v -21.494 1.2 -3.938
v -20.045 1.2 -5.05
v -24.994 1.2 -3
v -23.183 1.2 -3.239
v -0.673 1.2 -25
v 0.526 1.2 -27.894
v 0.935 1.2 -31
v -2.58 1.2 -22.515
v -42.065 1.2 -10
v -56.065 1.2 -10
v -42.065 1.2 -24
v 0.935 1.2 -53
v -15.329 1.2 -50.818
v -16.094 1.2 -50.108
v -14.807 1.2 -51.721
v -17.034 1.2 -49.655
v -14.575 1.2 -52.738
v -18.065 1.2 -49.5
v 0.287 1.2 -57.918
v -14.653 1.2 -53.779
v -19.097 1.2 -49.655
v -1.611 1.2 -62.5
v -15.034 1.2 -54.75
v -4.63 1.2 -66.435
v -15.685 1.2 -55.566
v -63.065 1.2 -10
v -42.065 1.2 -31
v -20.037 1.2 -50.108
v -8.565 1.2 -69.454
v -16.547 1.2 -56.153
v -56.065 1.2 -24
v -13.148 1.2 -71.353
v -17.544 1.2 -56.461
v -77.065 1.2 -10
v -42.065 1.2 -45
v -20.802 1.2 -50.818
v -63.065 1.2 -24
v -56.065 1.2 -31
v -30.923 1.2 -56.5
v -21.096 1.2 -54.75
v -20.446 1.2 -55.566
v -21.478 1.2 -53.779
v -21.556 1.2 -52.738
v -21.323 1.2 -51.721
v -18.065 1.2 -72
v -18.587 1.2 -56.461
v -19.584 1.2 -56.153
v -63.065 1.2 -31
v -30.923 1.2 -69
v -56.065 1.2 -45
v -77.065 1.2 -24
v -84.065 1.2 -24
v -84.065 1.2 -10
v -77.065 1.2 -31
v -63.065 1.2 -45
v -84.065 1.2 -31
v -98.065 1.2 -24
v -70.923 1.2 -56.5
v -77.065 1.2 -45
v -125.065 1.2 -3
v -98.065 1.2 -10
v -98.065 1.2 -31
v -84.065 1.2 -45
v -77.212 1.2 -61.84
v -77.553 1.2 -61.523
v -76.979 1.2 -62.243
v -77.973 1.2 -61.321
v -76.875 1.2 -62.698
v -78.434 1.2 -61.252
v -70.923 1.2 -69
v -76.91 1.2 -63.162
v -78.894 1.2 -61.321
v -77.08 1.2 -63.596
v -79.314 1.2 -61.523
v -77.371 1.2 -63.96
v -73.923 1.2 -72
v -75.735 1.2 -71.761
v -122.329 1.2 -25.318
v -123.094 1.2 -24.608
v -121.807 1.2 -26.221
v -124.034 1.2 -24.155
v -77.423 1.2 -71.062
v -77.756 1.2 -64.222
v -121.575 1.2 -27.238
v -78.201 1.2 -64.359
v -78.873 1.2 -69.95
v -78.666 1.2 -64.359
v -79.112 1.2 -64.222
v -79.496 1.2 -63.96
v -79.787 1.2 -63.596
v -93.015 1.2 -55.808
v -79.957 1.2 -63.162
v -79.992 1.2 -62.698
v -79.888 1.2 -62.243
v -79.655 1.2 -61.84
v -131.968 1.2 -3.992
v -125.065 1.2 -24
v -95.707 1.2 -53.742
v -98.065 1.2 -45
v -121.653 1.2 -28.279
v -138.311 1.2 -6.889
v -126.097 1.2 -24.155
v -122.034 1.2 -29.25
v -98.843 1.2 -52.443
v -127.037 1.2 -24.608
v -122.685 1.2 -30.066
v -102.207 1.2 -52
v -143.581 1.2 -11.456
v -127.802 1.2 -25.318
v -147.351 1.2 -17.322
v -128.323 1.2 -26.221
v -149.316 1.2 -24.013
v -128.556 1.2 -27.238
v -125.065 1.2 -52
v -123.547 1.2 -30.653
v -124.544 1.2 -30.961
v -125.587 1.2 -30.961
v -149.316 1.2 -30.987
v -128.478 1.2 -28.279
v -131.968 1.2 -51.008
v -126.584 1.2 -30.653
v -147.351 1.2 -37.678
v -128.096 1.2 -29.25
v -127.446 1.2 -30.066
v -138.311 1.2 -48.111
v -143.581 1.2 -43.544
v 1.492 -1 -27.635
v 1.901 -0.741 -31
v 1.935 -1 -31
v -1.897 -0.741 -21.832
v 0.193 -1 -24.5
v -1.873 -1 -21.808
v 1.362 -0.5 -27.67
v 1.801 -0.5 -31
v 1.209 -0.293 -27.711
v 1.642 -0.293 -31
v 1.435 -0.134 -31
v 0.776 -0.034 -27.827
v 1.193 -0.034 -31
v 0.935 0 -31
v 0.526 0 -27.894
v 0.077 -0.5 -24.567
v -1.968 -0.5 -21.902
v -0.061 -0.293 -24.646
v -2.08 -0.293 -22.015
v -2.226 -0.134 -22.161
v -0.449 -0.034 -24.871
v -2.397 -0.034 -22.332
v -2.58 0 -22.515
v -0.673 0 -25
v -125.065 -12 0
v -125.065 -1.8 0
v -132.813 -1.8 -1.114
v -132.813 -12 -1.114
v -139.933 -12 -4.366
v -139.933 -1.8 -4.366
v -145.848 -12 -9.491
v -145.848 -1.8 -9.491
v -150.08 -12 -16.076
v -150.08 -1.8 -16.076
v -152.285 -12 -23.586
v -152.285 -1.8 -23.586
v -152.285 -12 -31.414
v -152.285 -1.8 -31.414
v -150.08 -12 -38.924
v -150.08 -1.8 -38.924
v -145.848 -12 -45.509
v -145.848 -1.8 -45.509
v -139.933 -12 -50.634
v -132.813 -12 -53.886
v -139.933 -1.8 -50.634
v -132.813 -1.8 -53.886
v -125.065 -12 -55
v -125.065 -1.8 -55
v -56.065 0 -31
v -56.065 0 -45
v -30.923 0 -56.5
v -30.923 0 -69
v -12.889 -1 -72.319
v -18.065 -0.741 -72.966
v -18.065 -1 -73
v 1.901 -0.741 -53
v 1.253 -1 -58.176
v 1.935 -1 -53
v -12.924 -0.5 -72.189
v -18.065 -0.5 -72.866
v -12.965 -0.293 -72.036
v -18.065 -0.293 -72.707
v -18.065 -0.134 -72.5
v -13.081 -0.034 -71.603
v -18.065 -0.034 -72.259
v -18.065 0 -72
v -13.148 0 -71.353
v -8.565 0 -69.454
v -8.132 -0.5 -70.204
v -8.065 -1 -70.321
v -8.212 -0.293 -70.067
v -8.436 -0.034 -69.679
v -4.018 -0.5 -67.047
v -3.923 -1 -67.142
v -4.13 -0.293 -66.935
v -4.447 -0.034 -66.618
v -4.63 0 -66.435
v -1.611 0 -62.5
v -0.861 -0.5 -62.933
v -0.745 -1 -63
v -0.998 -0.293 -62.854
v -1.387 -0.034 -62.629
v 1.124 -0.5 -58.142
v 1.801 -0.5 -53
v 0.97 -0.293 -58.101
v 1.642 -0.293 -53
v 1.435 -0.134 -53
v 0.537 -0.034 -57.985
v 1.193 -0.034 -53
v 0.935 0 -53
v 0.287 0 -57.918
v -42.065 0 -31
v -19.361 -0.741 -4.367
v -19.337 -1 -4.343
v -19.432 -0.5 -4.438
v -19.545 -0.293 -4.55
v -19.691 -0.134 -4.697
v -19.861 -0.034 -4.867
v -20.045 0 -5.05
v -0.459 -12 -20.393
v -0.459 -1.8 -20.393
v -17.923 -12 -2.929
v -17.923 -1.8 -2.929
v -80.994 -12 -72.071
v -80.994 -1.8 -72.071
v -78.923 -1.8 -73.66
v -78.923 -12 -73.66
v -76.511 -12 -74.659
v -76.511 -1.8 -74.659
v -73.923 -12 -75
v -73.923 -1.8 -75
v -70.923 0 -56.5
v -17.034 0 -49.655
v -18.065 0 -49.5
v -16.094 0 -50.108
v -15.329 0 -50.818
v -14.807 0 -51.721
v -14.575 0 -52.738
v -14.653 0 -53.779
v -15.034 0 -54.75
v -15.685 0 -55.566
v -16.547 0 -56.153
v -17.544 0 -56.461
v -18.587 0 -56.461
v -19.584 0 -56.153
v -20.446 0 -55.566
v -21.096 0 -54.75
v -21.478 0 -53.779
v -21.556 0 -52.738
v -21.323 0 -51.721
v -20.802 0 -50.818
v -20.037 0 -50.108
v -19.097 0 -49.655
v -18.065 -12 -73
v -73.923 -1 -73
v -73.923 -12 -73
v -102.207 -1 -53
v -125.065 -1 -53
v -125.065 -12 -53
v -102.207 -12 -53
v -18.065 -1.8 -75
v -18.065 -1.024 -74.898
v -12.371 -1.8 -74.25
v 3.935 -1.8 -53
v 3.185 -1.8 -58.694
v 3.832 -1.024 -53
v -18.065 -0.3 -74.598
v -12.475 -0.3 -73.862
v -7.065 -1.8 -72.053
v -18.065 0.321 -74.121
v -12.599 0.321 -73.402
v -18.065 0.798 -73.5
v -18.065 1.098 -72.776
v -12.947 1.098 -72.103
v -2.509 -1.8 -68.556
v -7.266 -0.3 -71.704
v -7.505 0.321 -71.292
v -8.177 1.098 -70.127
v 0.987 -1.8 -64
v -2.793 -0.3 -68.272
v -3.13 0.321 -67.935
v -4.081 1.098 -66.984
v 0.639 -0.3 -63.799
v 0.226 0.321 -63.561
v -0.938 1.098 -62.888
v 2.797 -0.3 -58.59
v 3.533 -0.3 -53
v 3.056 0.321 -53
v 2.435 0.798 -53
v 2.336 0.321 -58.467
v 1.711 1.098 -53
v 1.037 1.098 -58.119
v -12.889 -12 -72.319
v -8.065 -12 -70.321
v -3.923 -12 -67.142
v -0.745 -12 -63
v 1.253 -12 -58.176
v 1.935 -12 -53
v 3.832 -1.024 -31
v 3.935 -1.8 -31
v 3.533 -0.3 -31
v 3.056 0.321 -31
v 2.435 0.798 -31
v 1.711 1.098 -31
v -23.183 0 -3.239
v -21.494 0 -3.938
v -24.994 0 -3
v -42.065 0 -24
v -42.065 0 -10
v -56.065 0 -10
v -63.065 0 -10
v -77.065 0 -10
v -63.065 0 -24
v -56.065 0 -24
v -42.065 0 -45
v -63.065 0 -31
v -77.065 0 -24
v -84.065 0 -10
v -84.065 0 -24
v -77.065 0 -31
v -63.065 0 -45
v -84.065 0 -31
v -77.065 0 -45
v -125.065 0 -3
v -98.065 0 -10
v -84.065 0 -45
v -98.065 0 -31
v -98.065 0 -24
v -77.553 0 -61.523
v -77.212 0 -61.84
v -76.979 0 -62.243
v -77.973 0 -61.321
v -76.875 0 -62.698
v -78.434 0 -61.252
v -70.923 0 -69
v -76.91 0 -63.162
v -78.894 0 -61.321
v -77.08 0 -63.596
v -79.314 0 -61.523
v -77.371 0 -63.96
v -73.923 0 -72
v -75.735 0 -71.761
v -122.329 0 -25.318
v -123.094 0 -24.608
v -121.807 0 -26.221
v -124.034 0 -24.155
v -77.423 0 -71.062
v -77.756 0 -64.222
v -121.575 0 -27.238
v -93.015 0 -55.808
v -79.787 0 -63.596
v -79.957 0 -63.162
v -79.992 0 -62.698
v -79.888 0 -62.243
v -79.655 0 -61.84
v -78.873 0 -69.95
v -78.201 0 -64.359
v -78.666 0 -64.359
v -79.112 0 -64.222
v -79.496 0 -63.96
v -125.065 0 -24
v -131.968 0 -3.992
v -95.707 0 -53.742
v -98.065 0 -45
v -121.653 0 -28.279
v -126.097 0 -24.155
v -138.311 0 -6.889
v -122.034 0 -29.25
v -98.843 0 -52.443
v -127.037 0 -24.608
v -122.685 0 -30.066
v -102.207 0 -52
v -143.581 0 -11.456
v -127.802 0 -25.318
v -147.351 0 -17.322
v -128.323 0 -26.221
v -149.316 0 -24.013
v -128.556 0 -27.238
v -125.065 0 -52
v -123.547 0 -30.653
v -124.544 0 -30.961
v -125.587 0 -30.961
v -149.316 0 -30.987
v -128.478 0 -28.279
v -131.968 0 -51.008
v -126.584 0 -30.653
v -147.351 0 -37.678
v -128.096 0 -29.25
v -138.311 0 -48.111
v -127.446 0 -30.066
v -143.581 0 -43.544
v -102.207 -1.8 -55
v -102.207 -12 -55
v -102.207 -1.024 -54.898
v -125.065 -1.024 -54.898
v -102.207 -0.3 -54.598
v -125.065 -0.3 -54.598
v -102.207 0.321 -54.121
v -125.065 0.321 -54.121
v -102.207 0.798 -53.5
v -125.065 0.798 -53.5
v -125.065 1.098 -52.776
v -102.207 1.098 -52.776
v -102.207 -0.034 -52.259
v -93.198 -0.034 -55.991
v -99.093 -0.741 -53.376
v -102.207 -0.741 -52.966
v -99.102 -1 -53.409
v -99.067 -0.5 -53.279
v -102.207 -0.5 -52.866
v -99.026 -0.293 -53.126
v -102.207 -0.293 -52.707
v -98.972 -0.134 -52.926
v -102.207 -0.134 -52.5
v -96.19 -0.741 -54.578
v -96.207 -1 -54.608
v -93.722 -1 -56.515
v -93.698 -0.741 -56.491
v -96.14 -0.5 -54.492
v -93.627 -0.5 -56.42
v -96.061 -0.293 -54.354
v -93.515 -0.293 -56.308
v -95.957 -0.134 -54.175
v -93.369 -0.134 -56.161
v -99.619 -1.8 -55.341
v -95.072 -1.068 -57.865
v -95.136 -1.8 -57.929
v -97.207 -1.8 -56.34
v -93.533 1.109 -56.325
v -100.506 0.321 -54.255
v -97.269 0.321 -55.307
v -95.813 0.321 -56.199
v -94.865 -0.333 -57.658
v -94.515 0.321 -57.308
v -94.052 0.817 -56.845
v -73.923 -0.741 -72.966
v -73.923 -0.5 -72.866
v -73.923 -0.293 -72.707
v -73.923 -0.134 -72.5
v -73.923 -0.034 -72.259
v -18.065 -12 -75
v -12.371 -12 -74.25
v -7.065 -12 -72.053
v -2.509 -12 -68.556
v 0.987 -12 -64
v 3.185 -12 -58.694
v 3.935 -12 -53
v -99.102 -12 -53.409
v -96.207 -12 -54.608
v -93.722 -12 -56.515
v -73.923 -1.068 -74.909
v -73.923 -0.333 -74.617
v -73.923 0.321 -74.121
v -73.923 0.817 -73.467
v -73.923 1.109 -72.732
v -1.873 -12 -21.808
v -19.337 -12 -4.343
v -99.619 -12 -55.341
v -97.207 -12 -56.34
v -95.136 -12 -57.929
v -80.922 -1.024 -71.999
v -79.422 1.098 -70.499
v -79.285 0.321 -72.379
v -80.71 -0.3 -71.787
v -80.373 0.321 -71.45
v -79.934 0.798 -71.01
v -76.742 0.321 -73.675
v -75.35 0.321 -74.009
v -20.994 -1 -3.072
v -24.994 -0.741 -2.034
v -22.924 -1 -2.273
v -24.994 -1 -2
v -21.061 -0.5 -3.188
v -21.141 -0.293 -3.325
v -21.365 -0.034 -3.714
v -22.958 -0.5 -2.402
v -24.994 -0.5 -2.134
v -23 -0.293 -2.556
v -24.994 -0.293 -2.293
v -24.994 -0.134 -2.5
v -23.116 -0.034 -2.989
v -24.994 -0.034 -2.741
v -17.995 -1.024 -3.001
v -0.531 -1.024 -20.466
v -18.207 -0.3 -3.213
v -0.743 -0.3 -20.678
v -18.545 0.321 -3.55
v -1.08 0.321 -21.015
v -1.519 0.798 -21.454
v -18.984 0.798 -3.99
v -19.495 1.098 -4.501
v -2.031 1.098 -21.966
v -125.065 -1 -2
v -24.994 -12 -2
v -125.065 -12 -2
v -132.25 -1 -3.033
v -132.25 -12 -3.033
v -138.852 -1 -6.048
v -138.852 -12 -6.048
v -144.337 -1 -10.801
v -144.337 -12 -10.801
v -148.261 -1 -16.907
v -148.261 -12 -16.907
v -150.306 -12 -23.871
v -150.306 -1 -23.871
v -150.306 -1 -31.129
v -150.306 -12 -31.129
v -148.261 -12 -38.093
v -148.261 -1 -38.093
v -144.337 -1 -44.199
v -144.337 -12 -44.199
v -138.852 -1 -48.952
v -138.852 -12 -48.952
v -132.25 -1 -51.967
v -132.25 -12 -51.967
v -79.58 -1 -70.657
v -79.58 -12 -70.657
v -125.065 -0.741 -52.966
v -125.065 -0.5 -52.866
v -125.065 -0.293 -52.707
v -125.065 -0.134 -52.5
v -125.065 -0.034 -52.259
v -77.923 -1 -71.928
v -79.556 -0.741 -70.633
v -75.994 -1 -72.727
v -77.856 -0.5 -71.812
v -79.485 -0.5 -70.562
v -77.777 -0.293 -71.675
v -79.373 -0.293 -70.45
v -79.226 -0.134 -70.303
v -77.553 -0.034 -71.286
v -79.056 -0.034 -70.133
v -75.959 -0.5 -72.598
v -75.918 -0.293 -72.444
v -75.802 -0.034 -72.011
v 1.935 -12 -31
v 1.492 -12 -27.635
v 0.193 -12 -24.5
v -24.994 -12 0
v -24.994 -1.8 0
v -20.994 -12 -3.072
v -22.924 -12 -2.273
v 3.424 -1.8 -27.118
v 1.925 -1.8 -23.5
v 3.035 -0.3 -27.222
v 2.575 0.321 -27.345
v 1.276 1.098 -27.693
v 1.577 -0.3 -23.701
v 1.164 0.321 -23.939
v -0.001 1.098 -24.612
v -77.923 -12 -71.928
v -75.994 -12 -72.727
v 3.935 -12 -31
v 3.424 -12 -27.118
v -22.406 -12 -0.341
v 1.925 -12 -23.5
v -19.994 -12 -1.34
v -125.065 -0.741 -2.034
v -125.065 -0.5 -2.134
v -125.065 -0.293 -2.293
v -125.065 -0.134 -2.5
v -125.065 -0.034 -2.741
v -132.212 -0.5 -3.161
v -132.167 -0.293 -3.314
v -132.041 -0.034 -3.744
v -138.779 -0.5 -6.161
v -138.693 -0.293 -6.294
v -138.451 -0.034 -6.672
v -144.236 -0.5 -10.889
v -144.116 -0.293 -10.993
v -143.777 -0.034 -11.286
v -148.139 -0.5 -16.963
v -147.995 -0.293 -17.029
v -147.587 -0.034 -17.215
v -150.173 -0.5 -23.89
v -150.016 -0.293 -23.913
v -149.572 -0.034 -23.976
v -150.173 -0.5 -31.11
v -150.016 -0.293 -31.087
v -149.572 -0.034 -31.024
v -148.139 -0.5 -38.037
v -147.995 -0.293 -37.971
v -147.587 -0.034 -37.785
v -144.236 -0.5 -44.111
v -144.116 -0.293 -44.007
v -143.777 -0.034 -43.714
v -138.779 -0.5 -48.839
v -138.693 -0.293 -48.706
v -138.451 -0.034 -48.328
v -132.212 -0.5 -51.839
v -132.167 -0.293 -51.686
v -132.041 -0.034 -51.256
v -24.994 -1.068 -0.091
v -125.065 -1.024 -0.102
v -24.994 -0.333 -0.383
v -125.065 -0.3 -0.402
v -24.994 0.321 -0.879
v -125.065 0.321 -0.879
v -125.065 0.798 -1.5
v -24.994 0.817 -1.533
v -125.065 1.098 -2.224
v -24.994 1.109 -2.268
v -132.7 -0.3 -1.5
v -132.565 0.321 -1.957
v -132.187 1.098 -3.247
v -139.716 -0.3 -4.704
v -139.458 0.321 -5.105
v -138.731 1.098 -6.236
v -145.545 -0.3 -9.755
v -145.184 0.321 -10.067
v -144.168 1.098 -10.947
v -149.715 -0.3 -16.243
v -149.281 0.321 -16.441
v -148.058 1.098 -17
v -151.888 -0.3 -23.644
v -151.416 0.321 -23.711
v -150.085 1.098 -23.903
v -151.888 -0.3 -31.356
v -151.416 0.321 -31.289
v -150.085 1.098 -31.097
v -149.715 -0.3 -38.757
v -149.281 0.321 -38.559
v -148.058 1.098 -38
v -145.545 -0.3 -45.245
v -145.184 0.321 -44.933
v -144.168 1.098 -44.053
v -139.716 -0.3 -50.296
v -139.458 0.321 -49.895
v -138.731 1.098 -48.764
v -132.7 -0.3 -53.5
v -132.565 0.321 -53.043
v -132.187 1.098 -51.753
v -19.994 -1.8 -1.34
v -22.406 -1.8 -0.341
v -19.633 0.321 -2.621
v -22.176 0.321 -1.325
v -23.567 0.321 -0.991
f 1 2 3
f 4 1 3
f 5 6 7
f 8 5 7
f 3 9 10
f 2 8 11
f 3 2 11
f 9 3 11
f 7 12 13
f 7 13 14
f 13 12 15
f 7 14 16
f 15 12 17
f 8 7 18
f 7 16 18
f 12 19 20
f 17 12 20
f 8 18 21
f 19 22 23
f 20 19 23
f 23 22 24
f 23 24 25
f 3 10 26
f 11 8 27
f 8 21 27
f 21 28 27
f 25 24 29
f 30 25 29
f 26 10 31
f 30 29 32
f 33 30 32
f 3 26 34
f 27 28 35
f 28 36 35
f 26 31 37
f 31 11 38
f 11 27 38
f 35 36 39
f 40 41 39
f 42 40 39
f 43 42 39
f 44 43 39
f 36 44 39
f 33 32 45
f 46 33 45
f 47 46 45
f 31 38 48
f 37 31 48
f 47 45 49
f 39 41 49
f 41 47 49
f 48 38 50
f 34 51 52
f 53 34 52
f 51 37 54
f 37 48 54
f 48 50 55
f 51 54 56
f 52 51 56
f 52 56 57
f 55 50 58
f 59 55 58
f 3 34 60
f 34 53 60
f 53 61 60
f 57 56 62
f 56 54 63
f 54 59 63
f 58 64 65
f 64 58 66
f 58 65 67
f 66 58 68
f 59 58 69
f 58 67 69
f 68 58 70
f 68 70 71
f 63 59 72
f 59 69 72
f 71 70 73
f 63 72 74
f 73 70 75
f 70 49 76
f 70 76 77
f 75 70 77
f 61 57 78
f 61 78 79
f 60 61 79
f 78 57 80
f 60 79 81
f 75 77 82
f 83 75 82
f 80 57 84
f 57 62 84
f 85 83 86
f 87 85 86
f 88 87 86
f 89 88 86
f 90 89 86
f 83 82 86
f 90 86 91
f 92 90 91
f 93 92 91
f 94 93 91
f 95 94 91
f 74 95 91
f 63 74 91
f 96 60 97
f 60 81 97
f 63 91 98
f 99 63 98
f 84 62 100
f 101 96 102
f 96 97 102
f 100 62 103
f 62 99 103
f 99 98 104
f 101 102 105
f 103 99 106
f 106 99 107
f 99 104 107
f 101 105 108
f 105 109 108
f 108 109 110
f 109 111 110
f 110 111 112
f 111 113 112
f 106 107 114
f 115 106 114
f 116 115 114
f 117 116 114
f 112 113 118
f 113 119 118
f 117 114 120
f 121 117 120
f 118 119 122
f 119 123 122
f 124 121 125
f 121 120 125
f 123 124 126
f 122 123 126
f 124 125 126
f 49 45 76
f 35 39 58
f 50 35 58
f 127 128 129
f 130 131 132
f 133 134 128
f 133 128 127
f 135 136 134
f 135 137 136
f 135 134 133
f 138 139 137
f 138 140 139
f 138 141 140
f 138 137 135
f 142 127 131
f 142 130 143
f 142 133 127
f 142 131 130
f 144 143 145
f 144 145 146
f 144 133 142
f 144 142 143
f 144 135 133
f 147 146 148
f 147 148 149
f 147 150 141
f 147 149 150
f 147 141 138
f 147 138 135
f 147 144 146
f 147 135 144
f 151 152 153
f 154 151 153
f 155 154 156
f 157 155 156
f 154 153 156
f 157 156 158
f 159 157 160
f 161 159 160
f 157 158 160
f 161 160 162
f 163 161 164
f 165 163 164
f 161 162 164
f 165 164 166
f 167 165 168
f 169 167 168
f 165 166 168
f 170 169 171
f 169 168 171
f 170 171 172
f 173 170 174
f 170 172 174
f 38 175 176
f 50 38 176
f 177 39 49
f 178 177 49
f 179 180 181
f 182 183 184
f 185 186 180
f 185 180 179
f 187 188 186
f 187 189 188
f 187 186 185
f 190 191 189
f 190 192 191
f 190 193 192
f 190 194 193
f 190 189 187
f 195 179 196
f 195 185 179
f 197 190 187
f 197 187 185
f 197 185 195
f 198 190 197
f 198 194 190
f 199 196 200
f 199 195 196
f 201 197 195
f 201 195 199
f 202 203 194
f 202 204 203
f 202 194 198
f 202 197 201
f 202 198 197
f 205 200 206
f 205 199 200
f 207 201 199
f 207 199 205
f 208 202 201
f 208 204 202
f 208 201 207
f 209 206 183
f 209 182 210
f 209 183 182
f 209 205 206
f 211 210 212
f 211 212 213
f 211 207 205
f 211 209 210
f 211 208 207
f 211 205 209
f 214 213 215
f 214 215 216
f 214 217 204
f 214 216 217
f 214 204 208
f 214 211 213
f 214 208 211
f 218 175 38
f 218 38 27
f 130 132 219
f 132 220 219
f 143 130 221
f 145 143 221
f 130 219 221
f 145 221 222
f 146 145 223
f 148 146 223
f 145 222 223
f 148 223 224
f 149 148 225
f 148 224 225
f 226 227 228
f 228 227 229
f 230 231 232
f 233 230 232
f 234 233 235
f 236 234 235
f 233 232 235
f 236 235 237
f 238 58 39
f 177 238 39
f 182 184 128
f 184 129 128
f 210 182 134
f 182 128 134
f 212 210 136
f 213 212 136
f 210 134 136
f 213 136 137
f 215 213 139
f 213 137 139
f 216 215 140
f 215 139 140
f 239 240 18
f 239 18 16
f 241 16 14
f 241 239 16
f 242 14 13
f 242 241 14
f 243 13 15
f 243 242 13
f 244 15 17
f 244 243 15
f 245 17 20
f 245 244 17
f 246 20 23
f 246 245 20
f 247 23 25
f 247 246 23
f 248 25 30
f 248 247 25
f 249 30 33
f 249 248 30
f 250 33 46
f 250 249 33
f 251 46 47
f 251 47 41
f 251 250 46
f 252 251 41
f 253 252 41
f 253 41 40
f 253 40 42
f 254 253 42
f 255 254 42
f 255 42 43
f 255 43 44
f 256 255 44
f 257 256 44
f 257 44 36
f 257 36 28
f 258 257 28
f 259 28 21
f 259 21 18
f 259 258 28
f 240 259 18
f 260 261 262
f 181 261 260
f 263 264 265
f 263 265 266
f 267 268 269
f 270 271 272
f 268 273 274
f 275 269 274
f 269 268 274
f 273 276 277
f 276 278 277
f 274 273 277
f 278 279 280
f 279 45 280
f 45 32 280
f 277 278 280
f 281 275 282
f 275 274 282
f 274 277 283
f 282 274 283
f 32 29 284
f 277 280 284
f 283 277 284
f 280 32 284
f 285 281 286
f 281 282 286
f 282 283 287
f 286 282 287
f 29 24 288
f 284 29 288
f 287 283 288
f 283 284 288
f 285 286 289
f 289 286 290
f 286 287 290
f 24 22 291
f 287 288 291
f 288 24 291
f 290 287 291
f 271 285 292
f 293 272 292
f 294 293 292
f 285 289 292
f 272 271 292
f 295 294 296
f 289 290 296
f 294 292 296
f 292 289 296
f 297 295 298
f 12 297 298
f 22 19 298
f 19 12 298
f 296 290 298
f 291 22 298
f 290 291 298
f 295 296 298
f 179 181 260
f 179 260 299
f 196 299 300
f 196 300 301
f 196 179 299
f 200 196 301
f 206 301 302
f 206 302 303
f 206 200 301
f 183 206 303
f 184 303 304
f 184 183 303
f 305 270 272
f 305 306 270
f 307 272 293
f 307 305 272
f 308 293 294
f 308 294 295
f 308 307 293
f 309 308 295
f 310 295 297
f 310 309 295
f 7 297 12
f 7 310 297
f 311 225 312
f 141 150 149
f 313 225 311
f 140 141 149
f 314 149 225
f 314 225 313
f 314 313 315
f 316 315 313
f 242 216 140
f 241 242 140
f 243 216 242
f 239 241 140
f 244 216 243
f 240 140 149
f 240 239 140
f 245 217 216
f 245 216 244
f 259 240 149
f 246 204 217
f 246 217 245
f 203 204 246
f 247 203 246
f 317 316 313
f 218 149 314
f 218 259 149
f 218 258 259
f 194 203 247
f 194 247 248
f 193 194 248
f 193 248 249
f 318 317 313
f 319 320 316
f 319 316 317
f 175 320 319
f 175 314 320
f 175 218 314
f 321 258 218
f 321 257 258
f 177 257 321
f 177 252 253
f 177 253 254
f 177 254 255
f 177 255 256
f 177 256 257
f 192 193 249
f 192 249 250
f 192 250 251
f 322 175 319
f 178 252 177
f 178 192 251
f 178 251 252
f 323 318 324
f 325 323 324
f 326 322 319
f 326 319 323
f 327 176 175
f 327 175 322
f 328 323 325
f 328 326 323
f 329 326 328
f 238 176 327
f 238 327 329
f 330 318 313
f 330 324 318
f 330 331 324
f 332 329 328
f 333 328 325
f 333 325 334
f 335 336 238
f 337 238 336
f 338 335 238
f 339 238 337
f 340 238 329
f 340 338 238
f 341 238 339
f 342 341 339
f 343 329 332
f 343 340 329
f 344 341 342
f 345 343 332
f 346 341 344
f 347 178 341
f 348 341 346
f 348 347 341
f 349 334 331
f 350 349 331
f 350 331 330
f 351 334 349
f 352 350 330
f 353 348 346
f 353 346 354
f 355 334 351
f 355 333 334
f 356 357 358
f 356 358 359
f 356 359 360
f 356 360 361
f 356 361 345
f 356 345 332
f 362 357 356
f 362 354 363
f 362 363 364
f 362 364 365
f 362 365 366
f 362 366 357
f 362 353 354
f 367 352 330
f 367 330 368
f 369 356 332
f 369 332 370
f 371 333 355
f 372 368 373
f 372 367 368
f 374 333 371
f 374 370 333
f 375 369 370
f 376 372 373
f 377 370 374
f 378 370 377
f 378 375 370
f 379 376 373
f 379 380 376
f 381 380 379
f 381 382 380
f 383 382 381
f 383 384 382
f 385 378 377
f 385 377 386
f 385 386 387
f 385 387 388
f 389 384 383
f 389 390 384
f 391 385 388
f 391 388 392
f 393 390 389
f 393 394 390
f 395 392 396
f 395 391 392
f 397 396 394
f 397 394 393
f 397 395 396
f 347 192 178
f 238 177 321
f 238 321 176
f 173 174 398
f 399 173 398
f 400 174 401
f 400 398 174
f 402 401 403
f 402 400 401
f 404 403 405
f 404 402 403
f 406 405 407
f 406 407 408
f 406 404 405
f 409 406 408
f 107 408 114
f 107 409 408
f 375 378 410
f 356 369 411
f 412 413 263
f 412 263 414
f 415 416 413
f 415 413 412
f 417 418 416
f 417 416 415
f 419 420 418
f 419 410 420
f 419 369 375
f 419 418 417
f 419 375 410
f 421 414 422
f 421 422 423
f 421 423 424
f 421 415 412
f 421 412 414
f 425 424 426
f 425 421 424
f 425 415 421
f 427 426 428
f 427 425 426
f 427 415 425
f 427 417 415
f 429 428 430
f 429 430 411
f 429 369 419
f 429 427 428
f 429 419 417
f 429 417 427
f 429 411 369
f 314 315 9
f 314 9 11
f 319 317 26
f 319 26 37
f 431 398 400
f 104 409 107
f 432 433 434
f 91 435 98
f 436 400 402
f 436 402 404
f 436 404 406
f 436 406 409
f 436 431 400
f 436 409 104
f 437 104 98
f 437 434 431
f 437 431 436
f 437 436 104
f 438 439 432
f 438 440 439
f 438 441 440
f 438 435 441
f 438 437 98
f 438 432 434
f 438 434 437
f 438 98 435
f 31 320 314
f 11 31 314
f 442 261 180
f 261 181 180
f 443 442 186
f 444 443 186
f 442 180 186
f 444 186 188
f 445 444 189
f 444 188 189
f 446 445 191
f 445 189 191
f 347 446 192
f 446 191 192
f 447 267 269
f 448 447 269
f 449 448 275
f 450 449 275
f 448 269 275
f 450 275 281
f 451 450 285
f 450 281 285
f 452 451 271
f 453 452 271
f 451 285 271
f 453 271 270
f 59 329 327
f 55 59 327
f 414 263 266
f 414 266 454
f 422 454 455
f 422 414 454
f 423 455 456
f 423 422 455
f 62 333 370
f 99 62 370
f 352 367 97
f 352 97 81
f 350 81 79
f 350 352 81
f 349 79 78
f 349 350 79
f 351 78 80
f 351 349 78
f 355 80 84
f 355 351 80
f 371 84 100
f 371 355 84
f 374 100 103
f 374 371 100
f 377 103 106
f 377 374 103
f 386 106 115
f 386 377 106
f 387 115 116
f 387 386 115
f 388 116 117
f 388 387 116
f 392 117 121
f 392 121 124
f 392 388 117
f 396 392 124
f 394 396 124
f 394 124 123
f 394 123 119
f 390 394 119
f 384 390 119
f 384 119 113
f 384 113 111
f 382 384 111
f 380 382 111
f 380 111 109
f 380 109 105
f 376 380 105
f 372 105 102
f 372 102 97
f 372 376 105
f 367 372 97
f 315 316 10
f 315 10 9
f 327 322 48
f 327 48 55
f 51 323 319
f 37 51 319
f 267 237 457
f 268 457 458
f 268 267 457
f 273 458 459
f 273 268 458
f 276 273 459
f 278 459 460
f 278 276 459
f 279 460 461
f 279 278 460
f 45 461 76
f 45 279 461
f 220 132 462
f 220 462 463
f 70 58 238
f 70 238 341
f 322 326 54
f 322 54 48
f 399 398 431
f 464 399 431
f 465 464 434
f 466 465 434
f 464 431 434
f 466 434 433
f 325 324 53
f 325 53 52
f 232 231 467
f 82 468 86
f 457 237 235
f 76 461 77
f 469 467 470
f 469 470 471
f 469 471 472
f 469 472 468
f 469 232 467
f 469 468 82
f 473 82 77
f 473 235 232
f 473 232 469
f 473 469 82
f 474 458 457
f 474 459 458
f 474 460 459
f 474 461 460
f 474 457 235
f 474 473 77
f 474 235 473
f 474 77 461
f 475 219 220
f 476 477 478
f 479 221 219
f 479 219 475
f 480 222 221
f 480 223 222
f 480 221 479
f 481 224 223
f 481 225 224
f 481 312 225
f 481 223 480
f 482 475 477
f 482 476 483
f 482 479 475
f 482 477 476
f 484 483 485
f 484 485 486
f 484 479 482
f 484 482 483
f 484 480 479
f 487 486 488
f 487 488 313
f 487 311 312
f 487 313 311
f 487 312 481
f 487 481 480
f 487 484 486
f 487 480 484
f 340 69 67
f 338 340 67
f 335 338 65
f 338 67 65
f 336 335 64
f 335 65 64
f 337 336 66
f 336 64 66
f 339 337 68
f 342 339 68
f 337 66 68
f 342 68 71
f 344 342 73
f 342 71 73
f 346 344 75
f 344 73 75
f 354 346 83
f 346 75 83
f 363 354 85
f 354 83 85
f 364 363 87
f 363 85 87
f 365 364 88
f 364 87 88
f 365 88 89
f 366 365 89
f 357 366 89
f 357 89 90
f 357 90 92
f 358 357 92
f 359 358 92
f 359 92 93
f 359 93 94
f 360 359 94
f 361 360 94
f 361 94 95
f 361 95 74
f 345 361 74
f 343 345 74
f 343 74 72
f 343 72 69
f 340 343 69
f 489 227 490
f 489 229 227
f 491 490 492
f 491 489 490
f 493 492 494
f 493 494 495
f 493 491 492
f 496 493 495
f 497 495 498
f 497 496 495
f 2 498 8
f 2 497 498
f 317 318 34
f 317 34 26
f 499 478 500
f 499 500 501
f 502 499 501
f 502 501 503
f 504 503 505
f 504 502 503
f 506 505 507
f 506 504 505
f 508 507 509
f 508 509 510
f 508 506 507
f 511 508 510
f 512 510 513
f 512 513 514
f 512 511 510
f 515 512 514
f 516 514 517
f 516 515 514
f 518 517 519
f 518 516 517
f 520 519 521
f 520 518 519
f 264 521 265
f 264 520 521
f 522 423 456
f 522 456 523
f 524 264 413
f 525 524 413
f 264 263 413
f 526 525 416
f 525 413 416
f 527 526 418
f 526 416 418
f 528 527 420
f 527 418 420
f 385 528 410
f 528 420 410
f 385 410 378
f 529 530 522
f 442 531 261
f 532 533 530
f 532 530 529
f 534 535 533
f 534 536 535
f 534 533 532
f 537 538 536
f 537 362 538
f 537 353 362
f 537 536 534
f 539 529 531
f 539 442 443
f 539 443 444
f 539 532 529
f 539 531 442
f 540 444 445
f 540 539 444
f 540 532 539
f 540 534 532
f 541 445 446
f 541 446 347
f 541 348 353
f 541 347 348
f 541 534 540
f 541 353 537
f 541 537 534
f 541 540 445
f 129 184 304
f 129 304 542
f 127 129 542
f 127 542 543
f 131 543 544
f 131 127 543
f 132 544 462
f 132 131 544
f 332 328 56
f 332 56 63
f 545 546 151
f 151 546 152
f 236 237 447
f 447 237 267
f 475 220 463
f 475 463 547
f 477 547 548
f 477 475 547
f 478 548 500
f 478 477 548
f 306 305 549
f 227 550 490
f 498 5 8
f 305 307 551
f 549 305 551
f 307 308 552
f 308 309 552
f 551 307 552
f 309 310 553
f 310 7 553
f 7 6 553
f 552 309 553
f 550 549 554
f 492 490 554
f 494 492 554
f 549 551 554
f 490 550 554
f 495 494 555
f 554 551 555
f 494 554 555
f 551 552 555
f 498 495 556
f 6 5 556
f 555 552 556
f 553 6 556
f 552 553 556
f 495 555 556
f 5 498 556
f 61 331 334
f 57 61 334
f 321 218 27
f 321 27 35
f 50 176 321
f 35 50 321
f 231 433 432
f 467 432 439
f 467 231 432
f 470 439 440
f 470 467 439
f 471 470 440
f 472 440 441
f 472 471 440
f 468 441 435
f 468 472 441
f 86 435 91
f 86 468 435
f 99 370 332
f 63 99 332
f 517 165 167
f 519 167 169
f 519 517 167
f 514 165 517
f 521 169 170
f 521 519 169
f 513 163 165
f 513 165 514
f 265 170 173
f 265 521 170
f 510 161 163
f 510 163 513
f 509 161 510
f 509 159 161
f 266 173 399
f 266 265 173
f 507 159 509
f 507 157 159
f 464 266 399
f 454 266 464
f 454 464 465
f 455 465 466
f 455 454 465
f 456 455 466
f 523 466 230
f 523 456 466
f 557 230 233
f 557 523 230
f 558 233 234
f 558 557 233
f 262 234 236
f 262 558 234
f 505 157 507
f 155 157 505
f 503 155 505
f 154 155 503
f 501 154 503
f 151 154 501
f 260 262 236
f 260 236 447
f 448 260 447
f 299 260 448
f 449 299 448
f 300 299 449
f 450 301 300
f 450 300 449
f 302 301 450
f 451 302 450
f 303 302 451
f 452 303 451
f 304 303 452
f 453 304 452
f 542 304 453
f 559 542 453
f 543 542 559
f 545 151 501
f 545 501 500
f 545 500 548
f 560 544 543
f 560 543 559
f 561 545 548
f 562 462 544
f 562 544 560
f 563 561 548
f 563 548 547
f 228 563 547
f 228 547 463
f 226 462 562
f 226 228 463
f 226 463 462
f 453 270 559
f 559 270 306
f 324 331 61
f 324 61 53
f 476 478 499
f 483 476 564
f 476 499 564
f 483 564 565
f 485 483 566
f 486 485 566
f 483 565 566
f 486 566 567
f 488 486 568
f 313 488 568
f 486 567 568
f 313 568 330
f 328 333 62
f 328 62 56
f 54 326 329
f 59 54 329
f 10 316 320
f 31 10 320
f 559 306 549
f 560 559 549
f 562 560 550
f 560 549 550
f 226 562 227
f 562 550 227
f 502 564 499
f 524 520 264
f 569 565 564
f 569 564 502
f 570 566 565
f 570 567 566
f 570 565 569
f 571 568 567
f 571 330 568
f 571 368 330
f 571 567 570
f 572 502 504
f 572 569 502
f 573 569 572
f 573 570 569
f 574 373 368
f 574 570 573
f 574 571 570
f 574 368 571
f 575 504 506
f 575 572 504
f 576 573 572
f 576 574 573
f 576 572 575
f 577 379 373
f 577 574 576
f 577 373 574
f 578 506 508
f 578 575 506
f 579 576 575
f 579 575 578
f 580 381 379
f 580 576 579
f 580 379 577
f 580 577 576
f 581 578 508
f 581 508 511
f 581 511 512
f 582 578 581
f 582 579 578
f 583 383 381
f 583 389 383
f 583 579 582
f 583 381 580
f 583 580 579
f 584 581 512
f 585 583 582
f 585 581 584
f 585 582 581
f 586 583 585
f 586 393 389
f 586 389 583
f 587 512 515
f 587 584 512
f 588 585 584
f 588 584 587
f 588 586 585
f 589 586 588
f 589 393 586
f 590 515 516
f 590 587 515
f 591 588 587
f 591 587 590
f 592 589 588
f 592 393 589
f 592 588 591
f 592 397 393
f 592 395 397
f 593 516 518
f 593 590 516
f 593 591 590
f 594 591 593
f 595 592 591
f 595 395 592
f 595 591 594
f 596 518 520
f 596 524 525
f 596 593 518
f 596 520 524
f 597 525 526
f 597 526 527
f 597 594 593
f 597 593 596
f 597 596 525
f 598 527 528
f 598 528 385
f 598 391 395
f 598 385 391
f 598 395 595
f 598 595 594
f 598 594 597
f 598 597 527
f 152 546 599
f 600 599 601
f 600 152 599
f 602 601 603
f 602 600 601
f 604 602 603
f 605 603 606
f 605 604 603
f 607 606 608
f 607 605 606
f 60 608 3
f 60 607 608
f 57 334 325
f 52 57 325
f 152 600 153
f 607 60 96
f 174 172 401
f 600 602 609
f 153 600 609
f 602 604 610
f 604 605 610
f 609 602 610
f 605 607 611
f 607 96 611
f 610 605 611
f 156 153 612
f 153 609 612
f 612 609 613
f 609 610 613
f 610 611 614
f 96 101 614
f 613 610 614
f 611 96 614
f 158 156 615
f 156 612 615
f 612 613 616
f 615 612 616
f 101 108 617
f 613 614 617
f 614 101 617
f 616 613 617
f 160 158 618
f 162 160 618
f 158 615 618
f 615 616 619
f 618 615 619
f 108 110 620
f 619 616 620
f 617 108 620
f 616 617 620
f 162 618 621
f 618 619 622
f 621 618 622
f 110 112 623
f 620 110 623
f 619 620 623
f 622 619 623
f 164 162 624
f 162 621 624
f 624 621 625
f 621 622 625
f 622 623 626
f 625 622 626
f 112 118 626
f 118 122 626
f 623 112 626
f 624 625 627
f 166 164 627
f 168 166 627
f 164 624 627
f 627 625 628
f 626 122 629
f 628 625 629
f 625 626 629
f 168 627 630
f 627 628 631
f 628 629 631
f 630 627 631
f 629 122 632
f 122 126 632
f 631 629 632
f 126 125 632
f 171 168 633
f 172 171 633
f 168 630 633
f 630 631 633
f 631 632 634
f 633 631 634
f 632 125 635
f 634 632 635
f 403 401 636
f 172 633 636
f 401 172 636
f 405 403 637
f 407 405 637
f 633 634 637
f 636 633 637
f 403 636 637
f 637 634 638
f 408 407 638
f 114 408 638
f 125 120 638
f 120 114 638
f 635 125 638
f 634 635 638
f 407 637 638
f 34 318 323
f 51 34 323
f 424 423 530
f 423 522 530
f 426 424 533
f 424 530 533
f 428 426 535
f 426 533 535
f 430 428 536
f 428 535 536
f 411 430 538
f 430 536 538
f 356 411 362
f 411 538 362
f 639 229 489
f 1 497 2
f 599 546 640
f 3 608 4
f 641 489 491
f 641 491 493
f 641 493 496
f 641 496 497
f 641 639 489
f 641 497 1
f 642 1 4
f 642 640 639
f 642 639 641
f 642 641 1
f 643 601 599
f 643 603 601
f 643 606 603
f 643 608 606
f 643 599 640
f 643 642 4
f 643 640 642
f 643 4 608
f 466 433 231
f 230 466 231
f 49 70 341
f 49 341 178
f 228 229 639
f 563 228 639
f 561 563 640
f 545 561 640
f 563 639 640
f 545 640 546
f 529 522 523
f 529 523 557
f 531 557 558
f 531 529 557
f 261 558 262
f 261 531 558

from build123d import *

# Parameters (mm, degrees)
SKETCH1_R           = 3.5
SKETCH1_W           = 14
SKETCH1_H           = 14
BOSS_EXTRUDE1_DEPTH = 1.2
FILLET1_R           = 10
BOSS_EXTRUDE2_DEPTH = 12
FILLET2_R           = 3
FILLET3_R           = 1
SKETCH4_R           = 1.5625
SKETCH4_W           = 40
SKETCH4_H           = 12.5
CUT_EXTRUDE1_DEPTH  = 171.515153338


with BuildPart() as part:
    # Sketch1 → Boss-Extrude1 (new body)
    with BuildSketch(Plane(origin=(0, 0, 0), x_dir=(1, 0, 0), z_dir=(0, 1, 0))):
        with BuildLine():
            Line((-125.065322034, 55), (-98.065322034, 55))
            Line((-98.065322034, 55), (-78.065322034, 75))
            Line((-78.065322034, 75), (-18.065322034, 75))
            ThreePointArc((-18.065322034, 75), (-2.508972848, 68.556349186), (3.934677966, 53))
            Line((3.934677966, 53), (3.934677966, 31))
            ThreePointArc((3.934677966, 31), (2.792870954, 25.259748515), (-0.458720316, 20.393398282))
            Line((-0.458720316, 20.393398282), (-20.852118598, 0))
            Line((-20.852118598, 0), (-25.734830863, 0))
            Line((-25.734830863, 0), (-125.065322034, 0))
            ThreePointArc((-125.065322034, 0), (-152.565322034, 27.5), (-125.065322034, 55))
        make_face()
        with Locations(Location((-125.065322034, 27.5, 0), (0, 0, 270))):
            Circle(SKETCH1_R, mode=Mode.SUBTRACT)
        with Locations(Location((-18.065322034, 53, 0), (0, 0, 270))):
            Circle(SKETCH1_R, mode=Mode.SUBTRACT)
        with Locations((-70.065322034, 17)):
            Rectangle(SKETCH1_W, SKETCH1_H, mode=Mode.SUBTRACT)
        with Locations((-91.065322034, 17)):
            Rectangle(SKETCH1_W, SKETCH1_H, mode=Mode.SUBTRACT)
        with Locations((-49.065322034, 17)):
            Rectangle(SKETCH1_W, SKETCH1_H, mode=Mode.SUBTRACT)
        with Locations((-70.065322034, 38)):
            Rectangle(SKETCH1_W, SKETCH1_H, mode=Mode.SUBTRACT)
        with Locations((-49.065322034, 38)):
            Rectangle(SKETCH1_W, SKETCH1_H, mode=Mode.SUBTRACT)
        with Locations((-91.065322034, 38)):
            Rectangle(SKETCH1_W, SKETCH1_H, mode=Mode.SUBTRACT)
    extrude(amount=BOSS_EXTRUDE1_DEPTH)

    # Fillet1
    fillet1_edges = [part.edges().sort_by_distance(p)[0] for p in [
        (-98.065322034, 0.6, -55),
        (-78.065322034, 0.6, -75),
        (-20.852118598, 0.6, 0),
    ]]
    fillet(fillet1_edges, radius=FILLET1_R)

    # Sketch3 → Boss-Extrude2 (add)
    with BuildSketch(Plane.XZ):
        with BuildLine():
            Line((-0.458720316, -20.393398282), (-17.92318641, -2.928932188))
            ThreePointArc((-17.92318641, -2.928932188), (-21.167419898, -0.761204675), (-24.994254222, 0))
            Line((-24.994254222, 0), (-125.065322034, 0))
            ThreePointArc((-125.065322034, 0), (-152.565322034, -27.5), (-125.065322034, -55))
            Line((-125.065322034, -55), (-102.207457658, -55))
            ThreePointArc((-102.207457658, -55), (-98.380623334, -55.761204675), (-95.136389846, -57.928932188))
            Line((-95.136389846, -57.928932188), (-80.994254222, -72.071067812))
            ThreePointArc((-80.994254222, -72.071067812), (-77.750020734, -74.238795325), (-73.92318641, -75))
            Line((-73.92318641, -75), (-18.065322034, -75))
            ThreePointArc((-18.065322034, -75), (-2.508972848, -68.556349186), (3.934677966, -53))
            Line((3.934677966, -53), (3.934677966, -31))
            ThreePointArc((3.934677966, -31), (2.792870954, -25.259748515), (-0.458720316, -20.393398282))
        make_face()
        with BuildLine():
            Line((-1.872933878, -21.807611845), (-19.337399973, -4.343145751))
            ThreePointArc((-19.337399973, -4.343145751), (-21.932786763, -2.60896374), (-24.994254222, -2))
            Line((-24.994254222, -2), (-125.065322034, -2))
            ThreePointArc((-125.065322034, -2), (-150.565322034, -27.5), (-125.065322034, -53))
            Line((-125.065322034, -53), (-102.207457658, -53))
            ThreePointArc((-102.207457658, -53), (-97.615256469, -53.91344561), (-93.722176283, -56.514718626))
            Line((-93.722176283, -56.514718626), (-79.58004066, -70.656854249))
            ThreePointArc((-79.58004066, -70.656854249), (-76.984653869, -72.39103626), (-73.92318641, -73))
            Line((-73.92318641, -73), (-18.065322034, -73))
            ThreePointArc((-18.065322034, -73), (-3.92318641, -67.142135624), (1.934677966, -53))
            Line((1.934677966, -53), (1.934677966, -31))
            ThreePointArc((1.934677966, -31), (0.945111889, -26.025115379), (-1.872933878, -21.807611845))
        make_face(mode=Mode.SUBTRACT)
    extrude(amount=BOSS_EXTRUDE2_DEPTH)

    # Fillet2
    fillet2_edges = [part.edges().sort_by_distance(p)[0] for p in [
        (-9.190953363, 1.2, -11.661165235),
        (-88.065322034, 1.2, -65),
        (-113.636389846, 1.2, -55),
        (-77.750020734, 1.2, -74.238795325),
        (-21.167419898, 1.2, -0.761204675),
        (-98.380623334, 1.2, -55.761204675),
        (2.792870954, 1.2, -25.259748515),
        (3.934677966, 1.2, -42),
        (-2.508972848, 1.2, -68.556349186),
        (-45.994254222, 1.2, -75),
        (-152.565322034, 1.2, -27.5),
        (-75.029788128, 1.2, 0),
    ]]
    fillet(fillet2_edges, radius=FILLET2_R)

    # Fillet3
    fillet3_edges = [part.edges().sort_by_distance(p)[0] for p in [
        (-97.615256469, 0, -53.91344561),
        (0.945111889, 0, -26.025115379),
        (-10.605166926, 0, -13.075378798),
        (-21.932786763, 0, -2.60896374),
        (-75.029788128, 0, -2),
        (-150.565322034, 0, -27.5),
        (-113.636389846, 0, -53),
        (-86.651108472, 0, -63.585786438),
        (-76.984653869, 0, -72.39103626),
        (-45.994254222, 0, -73),
        (-3.92318641, 0, -67.142135624),
        (1.934677966, 0, -42),
    ]]
    fillet(fillet3_edges, radius=FILLET3_R)

    # Sketch4 → Cut-Extrude1 (cut, through all)
    with BuildSketch(Plane(origin=(0, 1.2, 0), x_dir=(1, 0, 0), z_dir=(0, 1, 0))):
        with Locations(Location((-78.43359405, 62.814339828, 0), (0, 0, 270))):
            Circle(SKETCH4_R)
        with Locations((-50.92318641, 62.75)):
            Rectangle(SKETCH4_W, SKETCH4_H)
    extrude(amount=-CUT_EXTRUDE1_DEPTH, mode=Mode.SUBTRACT)


solid = part.part
